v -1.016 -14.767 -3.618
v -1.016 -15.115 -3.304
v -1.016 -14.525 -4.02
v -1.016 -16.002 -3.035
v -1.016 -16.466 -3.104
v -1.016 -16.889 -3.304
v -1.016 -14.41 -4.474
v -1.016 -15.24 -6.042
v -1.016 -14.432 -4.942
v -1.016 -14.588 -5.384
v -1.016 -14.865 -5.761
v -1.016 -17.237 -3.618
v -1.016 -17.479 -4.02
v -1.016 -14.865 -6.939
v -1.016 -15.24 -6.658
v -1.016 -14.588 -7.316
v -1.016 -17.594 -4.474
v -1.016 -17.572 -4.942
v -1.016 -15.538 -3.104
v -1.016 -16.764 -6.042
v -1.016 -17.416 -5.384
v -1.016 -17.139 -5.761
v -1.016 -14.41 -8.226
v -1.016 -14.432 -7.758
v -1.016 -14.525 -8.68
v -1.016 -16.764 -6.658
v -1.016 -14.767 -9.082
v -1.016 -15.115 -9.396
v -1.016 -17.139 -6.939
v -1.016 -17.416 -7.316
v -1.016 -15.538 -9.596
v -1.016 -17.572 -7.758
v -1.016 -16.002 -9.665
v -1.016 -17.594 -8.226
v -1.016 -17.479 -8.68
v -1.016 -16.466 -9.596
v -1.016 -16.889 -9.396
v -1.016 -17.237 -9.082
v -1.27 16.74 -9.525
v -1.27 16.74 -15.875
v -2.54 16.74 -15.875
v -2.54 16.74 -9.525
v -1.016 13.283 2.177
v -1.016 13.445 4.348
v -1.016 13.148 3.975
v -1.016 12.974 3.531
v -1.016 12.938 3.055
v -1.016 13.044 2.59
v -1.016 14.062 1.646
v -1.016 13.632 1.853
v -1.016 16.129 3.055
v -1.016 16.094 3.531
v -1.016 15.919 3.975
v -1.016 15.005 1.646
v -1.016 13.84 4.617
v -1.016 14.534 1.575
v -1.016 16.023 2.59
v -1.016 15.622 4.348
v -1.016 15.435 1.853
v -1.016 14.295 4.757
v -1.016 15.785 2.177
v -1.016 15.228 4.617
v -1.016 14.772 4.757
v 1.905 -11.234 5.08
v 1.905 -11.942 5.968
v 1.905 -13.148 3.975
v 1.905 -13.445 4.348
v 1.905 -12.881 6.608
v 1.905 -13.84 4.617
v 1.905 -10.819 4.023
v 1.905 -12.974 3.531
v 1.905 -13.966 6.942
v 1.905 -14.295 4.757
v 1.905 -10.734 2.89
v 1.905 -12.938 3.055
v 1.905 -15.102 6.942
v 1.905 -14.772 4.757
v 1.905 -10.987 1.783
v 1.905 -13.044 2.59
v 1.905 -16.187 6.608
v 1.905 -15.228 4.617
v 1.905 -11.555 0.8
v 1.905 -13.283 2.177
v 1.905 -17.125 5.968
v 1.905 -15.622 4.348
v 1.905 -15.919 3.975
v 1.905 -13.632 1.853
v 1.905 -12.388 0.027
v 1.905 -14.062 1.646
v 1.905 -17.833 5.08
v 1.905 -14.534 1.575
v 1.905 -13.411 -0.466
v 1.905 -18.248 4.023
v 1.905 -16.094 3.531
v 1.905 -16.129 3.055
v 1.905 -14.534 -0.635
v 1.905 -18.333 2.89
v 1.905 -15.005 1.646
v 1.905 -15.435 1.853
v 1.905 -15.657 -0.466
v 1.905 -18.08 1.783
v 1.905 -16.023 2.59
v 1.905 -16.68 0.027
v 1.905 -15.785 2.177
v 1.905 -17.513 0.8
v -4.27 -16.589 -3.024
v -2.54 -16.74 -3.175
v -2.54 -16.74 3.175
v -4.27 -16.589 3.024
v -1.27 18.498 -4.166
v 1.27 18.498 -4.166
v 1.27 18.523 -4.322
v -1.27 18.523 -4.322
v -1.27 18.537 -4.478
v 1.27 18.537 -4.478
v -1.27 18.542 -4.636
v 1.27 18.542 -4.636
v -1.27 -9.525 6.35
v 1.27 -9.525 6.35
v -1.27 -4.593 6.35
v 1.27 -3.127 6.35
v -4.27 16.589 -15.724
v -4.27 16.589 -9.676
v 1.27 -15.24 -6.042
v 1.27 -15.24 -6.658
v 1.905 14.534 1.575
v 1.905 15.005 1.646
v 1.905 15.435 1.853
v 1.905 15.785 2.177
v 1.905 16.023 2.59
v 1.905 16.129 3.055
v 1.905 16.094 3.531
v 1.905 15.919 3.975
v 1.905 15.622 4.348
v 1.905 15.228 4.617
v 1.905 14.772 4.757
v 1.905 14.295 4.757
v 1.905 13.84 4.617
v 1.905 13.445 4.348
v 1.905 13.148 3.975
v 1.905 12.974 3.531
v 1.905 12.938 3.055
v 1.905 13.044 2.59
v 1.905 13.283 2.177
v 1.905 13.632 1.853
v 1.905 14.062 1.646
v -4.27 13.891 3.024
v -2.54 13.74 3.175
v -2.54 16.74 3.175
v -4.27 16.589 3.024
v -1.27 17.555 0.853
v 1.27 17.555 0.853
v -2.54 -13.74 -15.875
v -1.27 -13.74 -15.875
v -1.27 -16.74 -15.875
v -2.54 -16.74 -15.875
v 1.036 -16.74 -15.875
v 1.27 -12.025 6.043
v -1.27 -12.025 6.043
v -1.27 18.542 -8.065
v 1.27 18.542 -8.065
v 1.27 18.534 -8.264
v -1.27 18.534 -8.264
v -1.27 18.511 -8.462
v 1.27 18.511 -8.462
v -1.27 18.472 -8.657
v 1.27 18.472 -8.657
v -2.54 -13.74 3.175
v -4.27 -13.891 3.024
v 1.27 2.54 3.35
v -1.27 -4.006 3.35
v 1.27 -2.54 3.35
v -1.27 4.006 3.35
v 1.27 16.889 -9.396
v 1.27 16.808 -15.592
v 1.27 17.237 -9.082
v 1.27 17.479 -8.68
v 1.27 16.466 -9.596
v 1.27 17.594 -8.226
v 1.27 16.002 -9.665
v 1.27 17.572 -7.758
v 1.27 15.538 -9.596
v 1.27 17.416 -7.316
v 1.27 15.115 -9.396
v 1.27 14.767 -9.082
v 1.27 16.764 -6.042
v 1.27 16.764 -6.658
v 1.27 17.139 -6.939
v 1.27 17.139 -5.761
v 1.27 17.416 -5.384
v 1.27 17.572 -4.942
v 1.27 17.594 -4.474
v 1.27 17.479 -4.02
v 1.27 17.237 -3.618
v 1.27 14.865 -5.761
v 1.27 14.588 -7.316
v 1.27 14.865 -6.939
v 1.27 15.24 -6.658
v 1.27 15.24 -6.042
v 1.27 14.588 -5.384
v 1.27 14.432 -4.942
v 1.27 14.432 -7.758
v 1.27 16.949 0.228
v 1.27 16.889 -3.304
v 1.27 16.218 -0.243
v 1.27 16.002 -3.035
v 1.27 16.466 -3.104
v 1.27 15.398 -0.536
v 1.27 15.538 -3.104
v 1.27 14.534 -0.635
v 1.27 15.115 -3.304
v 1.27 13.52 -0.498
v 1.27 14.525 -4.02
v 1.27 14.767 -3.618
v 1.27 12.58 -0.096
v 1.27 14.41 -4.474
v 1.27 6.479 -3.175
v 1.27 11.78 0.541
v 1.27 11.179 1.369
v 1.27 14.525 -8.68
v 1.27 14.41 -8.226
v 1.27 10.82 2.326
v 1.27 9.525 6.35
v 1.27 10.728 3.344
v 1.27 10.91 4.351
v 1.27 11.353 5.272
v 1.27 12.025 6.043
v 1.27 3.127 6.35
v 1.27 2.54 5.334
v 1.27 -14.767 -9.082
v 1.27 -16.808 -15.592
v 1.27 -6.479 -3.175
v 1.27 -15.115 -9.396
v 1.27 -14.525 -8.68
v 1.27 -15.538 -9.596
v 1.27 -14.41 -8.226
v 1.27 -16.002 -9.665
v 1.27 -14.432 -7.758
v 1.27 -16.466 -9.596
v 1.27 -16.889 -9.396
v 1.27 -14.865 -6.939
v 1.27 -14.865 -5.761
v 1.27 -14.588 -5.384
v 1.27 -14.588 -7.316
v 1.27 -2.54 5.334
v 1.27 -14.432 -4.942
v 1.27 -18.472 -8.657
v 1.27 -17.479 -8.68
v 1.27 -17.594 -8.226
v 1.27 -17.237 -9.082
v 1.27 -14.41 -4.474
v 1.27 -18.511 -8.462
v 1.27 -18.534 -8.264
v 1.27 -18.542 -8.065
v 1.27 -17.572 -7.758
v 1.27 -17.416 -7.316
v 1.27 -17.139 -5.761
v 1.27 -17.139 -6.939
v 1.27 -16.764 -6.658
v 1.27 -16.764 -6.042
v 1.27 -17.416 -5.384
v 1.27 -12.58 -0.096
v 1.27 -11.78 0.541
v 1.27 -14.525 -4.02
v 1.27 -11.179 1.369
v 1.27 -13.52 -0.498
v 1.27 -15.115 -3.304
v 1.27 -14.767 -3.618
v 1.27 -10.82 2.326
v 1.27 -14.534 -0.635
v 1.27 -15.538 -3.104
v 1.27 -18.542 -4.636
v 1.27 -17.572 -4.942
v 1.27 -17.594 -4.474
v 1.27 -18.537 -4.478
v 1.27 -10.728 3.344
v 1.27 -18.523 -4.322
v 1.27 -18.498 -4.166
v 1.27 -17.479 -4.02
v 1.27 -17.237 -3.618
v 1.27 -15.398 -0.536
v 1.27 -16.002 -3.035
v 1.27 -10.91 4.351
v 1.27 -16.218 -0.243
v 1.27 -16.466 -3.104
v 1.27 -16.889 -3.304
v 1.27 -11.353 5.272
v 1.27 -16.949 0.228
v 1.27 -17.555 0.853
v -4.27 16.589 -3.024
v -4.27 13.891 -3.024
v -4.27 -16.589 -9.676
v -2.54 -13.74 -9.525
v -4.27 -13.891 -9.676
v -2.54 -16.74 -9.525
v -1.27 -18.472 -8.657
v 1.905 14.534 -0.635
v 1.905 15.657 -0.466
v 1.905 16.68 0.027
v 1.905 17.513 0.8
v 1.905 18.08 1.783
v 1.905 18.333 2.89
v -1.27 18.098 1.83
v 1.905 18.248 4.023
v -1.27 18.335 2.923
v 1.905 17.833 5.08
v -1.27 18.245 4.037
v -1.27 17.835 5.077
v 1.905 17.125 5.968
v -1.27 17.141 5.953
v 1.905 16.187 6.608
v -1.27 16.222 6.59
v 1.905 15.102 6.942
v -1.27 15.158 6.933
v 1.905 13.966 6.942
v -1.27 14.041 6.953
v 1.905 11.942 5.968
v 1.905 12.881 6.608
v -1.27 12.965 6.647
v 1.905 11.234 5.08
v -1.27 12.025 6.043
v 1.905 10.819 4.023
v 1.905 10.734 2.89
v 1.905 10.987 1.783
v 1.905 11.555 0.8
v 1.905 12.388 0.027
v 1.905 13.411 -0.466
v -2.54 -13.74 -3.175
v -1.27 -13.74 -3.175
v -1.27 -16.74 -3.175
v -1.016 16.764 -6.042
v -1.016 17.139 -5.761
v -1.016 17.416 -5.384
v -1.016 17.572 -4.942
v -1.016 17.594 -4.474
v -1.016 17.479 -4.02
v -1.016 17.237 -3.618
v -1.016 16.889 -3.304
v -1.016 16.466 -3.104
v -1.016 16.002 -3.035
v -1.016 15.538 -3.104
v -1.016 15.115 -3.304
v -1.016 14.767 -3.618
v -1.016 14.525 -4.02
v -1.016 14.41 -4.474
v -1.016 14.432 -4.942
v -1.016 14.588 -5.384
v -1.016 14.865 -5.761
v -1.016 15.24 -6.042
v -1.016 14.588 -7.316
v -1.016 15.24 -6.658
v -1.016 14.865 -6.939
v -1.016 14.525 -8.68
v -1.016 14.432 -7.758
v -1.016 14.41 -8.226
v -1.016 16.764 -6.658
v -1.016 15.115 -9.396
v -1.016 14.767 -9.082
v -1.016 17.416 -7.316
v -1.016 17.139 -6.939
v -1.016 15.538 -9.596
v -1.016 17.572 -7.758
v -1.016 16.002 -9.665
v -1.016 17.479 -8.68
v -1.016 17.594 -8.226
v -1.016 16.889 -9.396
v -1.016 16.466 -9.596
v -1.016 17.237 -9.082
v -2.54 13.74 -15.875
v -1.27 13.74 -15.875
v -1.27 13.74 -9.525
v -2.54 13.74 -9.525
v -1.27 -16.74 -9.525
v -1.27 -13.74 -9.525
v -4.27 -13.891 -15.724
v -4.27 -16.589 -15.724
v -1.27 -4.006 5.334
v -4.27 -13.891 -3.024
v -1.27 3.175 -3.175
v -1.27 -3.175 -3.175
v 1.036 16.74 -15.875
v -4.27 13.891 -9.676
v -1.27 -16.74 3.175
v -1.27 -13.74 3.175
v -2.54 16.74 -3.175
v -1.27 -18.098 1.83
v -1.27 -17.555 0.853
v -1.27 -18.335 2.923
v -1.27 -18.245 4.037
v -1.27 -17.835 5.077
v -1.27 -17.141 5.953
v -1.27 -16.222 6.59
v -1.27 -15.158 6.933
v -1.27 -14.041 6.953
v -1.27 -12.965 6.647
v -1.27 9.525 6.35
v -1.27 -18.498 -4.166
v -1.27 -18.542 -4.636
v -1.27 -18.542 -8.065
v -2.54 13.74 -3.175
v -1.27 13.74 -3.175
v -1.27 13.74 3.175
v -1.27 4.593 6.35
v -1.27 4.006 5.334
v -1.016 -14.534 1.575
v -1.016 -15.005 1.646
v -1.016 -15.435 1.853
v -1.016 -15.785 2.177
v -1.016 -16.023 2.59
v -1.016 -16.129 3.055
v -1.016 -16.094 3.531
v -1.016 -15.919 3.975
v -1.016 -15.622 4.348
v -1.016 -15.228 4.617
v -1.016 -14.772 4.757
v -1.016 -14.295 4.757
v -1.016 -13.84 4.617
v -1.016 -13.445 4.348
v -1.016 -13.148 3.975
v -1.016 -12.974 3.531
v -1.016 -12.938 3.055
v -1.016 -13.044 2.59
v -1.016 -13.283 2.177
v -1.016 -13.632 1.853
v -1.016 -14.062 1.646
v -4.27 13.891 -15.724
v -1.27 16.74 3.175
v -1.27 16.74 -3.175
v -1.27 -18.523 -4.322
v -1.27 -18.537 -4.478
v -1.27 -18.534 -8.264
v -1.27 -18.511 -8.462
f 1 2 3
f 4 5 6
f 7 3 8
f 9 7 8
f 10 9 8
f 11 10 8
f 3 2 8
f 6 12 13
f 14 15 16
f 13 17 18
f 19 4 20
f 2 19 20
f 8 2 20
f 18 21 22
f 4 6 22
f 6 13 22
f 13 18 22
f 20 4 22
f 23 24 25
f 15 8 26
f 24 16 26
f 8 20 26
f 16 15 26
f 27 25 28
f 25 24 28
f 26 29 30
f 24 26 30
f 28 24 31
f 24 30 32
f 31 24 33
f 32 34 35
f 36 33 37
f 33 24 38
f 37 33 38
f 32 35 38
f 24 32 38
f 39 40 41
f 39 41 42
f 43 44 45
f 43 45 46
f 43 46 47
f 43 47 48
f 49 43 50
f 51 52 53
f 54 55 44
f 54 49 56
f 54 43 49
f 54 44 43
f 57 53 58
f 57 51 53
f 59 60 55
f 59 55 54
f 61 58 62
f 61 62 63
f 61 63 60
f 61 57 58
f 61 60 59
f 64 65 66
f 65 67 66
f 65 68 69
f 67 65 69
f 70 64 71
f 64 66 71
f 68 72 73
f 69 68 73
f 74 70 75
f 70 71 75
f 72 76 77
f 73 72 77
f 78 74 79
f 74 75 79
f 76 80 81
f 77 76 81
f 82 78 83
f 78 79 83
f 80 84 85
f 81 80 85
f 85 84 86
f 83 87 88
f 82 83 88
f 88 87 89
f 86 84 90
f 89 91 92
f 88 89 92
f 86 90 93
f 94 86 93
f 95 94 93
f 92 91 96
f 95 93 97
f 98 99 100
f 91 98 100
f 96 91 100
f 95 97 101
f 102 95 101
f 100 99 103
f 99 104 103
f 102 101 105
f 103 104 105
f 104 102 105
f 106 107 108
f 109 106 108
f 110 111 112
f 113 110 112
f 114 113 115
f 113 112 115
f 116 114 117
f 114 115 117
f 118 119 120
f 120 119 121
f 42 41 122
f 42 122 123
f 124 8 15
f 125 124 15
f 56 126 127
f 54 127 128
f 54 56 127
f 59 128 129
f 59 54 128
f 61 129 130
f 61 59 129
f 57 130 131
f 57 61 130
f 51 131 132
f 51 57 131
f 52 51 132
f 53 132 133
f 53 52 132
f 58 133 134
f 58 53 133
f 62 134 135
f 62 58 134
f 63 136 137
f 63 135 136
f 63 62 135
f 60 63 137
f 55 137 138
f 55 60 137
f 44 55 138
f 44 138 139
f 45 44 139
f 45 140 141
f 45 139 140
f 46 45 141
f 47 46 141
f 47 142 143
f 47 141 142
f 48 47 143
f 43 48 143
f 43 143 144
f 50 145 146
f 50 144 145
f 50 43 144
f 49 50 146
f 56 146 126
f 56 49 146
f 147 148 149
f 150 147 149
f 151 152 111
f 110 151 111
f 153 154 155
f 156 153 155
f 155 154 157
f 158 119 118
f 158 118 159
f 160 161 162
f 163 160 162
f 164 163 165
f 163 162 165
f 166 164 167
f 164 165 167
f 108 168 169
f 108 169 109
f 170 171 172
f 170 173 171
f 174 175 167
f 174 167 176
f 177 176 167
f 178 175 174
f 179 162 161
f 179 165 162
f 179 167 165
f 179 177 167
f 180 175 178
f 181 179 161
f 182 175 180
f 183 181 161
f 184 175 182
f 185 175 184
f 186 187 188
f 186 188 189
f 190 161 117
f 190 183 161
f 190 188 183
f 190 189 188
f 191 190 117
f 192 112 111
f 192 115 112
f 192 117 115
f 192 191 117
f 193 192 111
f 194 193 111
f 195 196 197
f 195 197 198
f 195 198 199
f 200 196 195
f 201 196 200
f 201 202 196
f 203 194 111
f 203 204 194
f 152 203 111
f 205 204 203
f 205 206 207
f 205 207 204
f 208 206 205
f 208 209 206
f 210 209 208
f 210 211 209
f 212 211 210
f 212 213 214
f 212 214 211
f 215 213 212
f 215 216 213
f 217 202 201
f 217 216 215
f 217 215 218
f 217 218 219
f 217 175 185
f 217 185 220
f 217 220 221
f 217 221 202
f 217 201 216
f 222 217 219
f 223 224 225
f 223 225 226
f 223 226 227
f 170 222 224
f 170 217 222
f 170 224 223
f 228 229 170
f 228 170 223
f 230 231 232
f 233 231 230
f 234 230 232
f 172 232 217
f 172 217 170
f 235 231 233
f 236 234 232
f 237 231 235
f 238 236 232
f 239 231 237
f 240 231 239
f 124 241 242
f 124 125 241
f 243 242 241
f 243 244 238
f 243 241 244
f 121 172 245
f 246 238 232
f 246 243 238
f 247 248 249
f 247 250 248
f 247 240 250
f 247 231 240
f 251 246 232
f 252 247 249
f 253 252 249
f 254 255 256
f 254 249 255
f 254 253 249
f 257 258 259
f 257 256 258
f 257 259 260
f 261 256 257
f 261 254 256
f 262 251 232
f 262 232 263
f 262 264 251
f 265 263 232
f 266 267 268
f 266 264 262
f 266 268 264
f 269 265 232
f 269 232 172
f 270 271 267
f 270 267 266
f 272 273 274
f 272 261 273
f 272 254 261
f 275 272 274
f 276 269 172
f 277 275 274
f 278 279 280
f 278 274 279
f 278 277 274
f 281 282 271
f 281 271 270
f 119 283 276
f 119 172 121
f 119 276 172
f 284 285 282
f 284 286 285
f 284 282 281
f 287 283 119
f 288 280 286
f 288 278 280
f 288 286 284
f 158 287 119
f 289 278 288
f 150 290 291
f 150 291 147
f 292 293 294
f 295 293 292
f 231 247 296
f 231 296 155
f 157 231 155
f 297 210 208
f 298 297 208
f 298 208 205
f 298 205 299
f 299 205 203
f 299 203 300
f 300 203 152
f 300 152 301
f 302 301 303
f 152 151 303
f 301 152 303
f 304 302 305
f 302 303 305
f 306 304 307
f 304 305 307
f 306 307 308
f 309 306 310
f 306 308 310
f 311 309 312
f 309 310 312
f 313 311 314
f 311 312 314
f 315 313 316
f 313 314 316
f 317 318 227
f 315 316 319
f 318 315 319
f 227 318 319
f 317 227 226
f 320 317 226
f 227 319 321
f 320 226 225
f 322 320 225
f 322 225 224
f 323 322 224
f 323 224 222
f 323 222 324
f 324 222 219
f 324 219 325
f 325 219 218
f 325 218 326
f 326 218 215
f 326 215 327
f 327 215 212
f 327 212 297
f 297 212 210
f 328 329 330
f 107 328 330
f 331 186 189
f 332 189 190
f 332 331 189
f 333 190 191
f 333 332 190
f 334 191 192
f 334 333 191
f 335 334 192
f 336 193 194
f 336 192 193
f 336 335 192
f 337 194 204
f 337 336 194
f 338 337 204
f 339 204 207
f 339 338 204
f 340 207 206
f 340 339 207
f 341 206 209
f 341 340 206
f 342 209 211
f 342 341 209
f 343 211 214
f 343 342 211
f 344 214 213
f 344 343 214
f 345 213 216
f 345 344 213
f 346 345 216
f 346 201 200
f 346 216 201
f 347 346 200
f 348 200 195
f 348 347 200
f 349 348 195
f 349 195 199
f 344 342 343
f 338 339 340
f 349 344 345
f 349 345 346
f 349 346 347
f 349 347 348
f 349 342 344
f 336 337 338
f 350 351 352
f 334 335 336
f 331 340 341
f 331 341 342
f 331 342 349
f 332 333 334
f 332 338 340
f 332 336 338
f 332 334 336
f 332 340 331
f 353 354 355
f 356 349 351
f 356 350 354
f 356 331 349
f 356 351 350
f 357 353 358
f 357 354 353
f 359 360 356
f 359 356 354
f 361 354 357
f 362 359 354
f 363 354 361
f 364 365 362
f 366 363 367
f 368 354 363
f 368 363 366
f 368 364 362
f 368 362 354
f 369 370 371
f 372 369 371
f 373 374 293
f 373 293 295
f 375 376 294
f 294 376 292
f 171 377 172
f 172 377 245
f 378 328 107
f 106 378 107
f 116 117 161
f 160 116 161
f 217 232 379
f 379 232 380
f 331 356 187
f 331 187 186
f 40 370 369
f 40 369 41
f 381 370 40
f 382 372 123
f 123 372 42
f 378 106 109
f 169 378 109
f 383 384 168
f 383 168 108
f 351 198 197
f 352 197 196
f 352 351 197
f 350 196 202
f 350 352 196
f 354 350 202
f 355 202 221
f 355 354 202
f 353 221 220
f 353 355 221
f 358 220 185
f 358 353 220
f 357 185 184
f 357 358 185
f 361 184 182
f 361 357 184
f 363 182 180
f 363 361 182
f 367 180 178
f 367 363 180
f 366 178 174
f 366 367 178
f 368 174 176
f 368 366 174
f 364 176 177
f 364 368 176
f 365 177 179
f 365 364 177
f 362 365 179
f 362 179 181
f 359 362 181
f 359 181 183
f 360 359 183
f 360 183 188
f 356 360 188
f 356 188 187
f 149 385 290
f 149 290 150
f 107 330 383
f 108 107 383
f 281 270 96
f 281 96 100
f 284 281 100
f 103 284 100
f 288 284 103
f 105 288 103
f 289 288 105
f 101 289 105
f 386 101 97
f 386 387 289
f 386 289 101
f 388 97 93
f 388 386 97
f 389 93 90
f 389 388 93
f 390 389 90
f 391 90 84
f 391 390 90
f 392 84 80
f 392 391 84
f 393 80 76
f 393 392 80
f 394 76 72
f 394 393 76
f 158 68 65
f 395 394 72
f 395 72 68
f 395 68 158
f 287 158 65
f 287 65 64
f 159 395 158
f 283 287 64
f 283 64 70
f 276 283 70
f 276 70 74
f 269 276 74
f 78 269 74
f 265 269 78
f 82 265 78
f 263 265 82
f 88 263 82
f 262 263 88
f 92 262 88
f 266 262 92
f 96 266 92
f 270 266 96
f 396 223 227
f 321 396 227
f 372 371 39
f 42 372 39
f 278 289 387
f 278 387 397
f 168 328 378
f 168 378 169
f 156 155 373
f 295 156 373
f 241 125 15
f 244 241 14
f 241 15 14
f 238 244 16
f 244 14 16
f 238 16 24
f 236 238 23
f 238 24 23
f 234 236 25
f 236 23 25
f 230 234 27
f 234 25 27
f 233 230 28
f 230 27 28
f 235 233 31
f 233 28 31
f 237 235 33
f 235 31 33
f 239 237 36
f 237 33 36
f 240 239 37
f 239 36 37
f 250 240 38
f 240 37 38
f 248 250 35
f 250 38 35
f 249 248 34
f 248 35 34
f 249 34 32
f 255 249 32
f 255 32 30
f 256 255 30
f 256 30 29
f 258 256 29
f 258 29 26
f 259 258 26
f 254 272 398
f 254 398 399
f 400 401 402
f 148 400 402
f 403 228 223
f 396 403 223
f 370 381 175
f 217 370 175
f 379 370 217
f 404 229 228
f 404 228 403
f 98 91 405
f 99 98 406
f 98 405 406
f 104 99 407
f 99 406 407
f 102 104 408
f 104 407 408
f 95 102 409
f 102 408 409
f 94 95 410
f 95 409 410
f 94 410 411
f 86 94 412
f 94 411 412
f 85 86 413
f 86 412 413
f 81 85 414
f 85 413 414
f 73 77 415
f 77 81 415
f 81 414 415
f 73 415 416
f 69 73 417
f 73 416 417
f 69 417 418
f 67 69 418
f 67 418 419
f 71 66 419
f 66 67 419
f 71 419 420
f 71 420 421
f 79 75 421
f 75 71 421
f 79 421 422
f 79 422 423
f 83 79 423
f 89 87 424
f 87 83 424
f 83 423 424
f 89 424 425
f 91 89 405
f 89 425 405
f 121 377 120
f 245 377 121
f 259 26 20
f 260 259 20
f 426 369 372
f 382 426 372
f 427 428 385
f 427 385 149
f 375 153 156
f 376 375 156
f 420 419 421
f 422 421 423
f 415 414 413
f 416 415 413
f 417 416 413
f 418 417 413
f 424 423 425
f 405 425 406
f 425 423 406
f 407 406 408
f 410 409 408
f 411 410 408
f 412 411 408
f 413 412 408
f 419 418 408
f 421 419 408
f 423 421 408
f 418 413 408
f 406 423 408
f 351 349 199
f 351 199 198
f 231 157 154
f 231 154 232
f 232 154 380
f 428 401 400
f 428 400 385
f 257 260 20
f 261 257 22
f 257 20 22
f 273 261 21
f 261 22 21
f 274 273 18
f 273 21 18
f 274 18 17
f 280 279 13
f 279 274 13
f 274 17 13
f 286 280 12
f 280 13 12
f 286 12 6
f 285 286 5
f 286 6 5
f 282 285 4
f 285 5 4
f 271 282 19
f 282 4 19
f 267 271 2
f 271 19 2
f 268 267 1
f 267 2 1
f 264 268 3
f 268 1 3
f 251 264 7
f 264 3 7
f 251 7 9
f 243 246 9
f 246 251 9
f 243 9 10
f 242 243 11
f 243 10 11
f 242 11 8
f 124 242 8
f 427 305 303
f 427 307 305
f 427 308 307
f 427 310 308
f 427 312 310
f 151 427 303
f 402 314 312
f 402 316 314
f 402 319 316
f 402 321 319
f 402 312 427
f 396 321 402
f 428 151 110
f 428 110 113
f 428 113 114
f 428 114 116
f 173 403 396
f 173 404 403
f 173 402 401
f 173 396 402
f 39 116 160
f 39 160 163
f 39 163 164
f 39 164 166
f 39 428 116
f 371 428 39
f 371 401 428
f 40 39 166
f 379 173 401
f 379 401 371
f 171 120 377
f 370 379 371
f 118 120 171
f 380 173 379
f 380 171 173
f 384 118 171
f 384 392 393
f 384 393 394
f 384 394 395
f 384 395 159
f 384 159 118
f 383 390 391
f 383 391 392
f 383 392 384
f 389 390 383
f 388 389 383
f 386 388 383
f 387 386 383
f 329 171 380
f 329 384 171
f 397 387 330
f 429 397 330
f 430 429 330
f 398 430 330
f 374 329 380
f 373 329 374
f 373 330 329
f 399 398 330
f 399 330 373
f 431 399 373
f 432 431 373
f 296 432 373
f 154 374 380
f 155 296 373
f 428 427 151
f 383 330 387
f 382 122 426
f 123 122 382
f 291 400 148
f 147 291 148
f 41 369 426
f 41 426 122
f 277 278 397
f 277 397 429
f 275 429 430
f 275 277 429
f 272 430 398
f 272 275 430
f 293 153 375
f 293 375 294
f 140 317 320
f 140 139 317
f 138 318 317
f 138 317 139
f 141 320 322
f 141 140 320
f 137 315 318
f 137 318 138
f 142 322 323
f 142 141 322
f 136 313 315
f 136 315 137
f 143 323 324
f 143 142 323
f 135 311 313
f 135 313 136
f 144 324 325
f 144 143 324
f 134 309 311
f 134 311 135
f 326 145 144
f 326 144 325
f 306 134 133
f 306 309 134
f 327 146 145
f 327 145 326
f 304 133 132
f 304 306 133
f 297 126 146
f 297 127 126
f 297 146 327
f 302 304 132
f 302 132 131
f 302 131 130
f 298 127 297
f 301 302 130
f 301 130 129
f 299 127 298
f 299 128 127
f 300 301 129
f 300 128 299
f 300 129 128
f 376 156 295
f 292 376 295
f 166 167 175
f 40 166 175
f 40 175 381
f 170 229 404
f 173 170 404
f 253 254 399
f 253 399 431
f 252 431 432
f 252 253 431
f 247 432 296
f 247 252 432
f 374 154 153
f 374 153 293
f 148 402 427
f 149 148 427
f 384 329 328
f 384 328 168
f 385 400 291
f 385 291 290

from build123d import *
from OCP.BRepFilletAPI import BRepFilletAPI_MakeChamfer

# Parameters (mm, degrees)
DOWELSUPPORT_DEPTH       = 1.905
DOWELSUPPORT_DEPTH_BACK  = 1.27
SKETCH3_R                = 3.81
SKETCH5_W                = 9.525
SKETCH5_H                = 19.05
SLIDERDOWELSUPPORT_DEPTH = 1.27
STRINGDOWELSUPPORT_DEPTH = 1.27
SKETCH9_W                = 6.35
SKETCH9_H                = 3
TABSUPPORT_DEPTH         = 1.27
INTERSUPPORT_DEPTH       = 1.27
DOWELHOLES_DEPTH         = 25.48367648
DOWELHOLES_DEPTH_BACK    = 25.48367648
SKETCH11_R               = 1.600000102
BOSS_EXTRUDE1_START      = -1.27
SKETCH11_2_R             = 1.600000102
BOSS_EXTRUDE1_DEPTH      = 0.254
SKETCH14_W               = 6.35
SKETCH14_H               = 3
TABBASE_DEPTH            = 1.27
SKETCH15_W               = 6.35
SKETCH15_H               = 3
TABDRAFT_DEPTH           = 1.73
TABDRAFT_DRAFT           = 5
TABDRAFT_PROFILE_2_DEPTH = 1.73
TABDRAFT_PROFILE_2_DRAFT = 5
CHAMFER1_SIZE            = 2.54
CUT_EXTRUDE2_DEPTH       = 3
CHAMFER2_SIZE            = 0.508
CHAMFER2_SIZE2           = 1.016


with BuildPart() as part:
    # Sketch3 → DowelSupport (new, two sides: drawn at the far end of the back side and taken through both)
    with BuildSketch(Plane(origin=(0, 0, 0), x_dir=(0, 0, -1), z_dir=(1, 0, 0)).offset(-DOWELSUPPORT_DEPTH_BACK)):
        with Locations((-3.175, 14.53375)):
            Circle(SKETCH3_R)
    extrude(amount=DOWELSUPPORT_DEPTH + DOWELSUPPORT_DEPTH_BACK)



with BuildPart() as body_2:
    # Sketch5 → SliderDowelSupport (new, symmetric)
    with BuildSketch(Plane(origin=(0, 0, 0), x_dir=(0, 0, -1), z_dir=(1, 0, 0))):
        with Locations((-1.5875, 0)):
            Rectangle(SKETCH5_W, SKETCH5_H)
    extrude(amount=SLIDERDOWELSUPPORT_DEPTH, both=True)


with BuildPart() as body_3:
    # Sketch8 → StringDowelSupport (new, symmetric)
    with BuildSketch(Plane(origin=(0, 0, 0), x_dir=(0, 0, -1), z_dir=(1, 0, 0))):
        with BuildLine():
            Line((4.6355, 18.542), (8.0645, 18.542))
            ThreePointArc((8.0645, 18.542), (10.6045, 16.002), (8.0645, 13.462))
            Line((8.0645, 13.462), (4.6355, 13.462))
            ThreePointArc((4.6355, 13.462), (2.0955, 16.002), (4.6355, 18.542))
        make_face()
    extrude(amount=STRINGDOWELSUPPORT_DEPTH, both=True)


with BuildPart() as part_1:
    add(part.part)

    add(body_3.part)  # TabSupport merges body 3
    # Sketch9 → TabSupport (add, symmetric)
    with BuildSketch(Plane(origin=(0, 0, 0), x_dir=(0, 0, -1), z_dir=(1, 0, 0))):
        with Locations((0, 15.24)):
            Rectangle(SKETCH9_W, SKETCH9_H)
        with Locations((12.7, 15.24)):
            Rectangle(SKETCH9_W, SKETCH9_H)
    extrude(amount=TABSUPPORT_DEPTH, both=True)


    add(body_2.part)  # InterSupport merges body 2
    # Sketch10 → InterSupport (add, symmetric)
    with BuildSketch(Plane(origin=(0, 0, 0), x_dir=(0, 0, -1), z_dir=(1, 0, 0))):
        Polygon((-6.35, 9.525), (-5.696013987, 14.843731414), (-3.644260291, 17.030026182), (4.166239709, 18.498276182), (8.657140431, 18.471894192), (15.875, 16.74), (15.875, 13.74), (3.175, 3.175), (3.175, 9.525), align=None)
    extrude(amount=INTERSUPPORT_DEPTH, both=True)

    # Sketch11 → DowelHoles (cut, two sides: drawn at the far end of the back side and taken through both)
    with BuildSketch(Plane(origin=(0, 0, 0), x_dir=(0, 0, -1), z_dir=(1, 0, 0)).offset(-DOWELHOLES_DEPTH_BACK)):
        with Locations((-3.175, 14.53375)):
            Circle(SKETCH11_R)
        with BuildLine():
            Line((6.04239599, 15.24), (6.65760401, 15.24))
            ThreePointArc((6.65760401, 15.24), (9.664500102, 16.002), (6.65760401, 16.764))
            Line((6.65760401, 16.764), (6.04239599, 16.764))
            ThreePointArc((6.04239599, 16.764), (3.035499898, 16.002), (6.04239599, 15.24))
        make_face()
    extrude(amount=DOWELHOLES_DEPTH + DOWELHOLES_DEPTH_BACK, mode=Mode.SUBTRACT)

    # Sketch11<2> → Boss-Extrude1 (add)
    with BuildSketch(Plane(origin=(0, 0, 0), x_dir=(0, 0, -1), z_dir=(1, 0, 0)).offset(BOSS_EXTRUDE1_START)):
        with BuildLine():
            Line((6.04239599, 15.24), (6.65760401, 15.24))
            ThreePointArc((6.65760401, 15.24), (9.664500102, 16.002), (6.65760401, 16.764))
            Line((6.65760401, 16.764), (6.04239599, 16.764))
            ThreePointArc((6.04239599, 16.764), (3.035499898, 16.002), (6.04239599, 15.24))
        make_face()
        with Locations((-3.175, 14.53375)):
            Circle(SKETCH11_2_R)
    extrude(amount=BOSS_EXTRUDE1_DEPTH)

    # Sketch14 → TabBase (add)
    with BuildSketch(Plane.ZY.offset(1.27)):
        with Locations((-12.7, 15.24)):
            Rectangle(SKETCH14_W, SKETCH14_H)
        with Locations((0, 15.24)):
            Rectangle(SKETCH14_W, SKETCH14_H)
    extrude(amount=TABBASE_DEPTH)


with BuildPart() as tabdraft_tool:
    # Sketch15 → TabDraft (with draft: the straight prism first)
    with BuildSketch(Plane.ZY.offset(2.54)):
        with Locations((0, 15.24)):
            Rectangle(SKETCH15_W, SKETCH15_H)
    extrude(amount=TABDRAFT_DEPTH)
    # TabDraft: the draft: its side faces are tilted about the plane it starts from
    tabdraft_sides = [tabdraft_tool.faces().sort_by_distance(p)[0] for p in [
        (-3.405, 15.24, -3.175),
        (-3.405, 13.74, 0),
        (-3.405, 15.24, 3.175),
        (-3.405, 16.74, 0),
    ]]
    draft(tabdraft_sides, Plane.ZY.offset(2.54), TABDRAFT_DRAFT)


with BuildPart() as part_2:
    add(part_1.part)

    # TabDraft: add tabdraft_tool
    add(tabdraft_tool.part)


with BuildPart() as tabdraft_profile_2_tool:
    # Sketch15 → TabDraft profile 2 (with draft: the straight prism first)
    with BuildSketch(Plane.ZY.offset(2.54)):
        with Locations((-12.7, 15.24)):
            Rectangle(SKETCH15_W, SKETCH15_H)
    extrude(amount=TABDRAFT_PROFILE_2_DEPTH)
    # TabDraft profile 2: the draft: its side faces are tilted about the plane it starts from
    tabdraft_profile_2_sides = [tabdraft_profile_2_tool.faces().sort_by_distance(p)[0] for p in [
        (-3.405, 15.24, -15.875),
        (-3.405, 13.74, -12.7),
        (-3.405, 15.24, -9.525),
        (-3.405, 16.74, -12.7),
    ]]
    draft(tabdraft_profile_2_sides, Plane.ZY.offset(2.54), TABDRAFT_PROFILE_2_DRAFT)


with BuildPart() as part_3:
    add(part_2.part)

    # TabDraft profile 2: add tabdraft_profile_2_tool
    add(tabdraft_profile_2_tool.part)

    # Chamfer1
    chamfer1_edges = [part_3.edges().sort_by_distance(p)[0] for p in [
        (1.27, 8.4575, -9.525),
    ]]
    chamfer(chamfer1_edges, length=CHAMFER1_SIZE - 0.0001)  # a hair under: the kernel refuses the full size

    # Mirror1: part across plane


with BuildPart() as part_4:
    add(part_3.part)
    add(part_3.part.mirror(Plane.ZX))

    # Sketch17 → Cut-Extrude2 (cut)
    with BuildSketch(Plane.XY.offset(6.35)):
        Polygon((-1.27, -4.006469684), (1.27, -2.54), (1.27, 2.54), (-1.27, 4.006469684), align=None)
    extrude(amount=-CUT_EXTRUDE2_DEPTH, mode=Mode.SUBTRACT)

    # Chamfer2: one chamfer whose edges measure the first distance from different faces: ONE call of the kernel's chamfer builder (chamfer() names one face for all edges)
    chamfer2_edges_1 = [part_4.edges().sort_by_distance(p)[0] for p in [
        (0, -3.273234842, 6.35),
    ]]
    chamfer2_side_1 = [part_4.faces().sort_by_distance(p)[0] for p in [
        (0.049650417, -6.38478458, 6.35),
    ]]
    chamfer2_edges_2 = [part_4.edges().sort_by_distance(p)[0] for p in [
        (0, 3.273234842, 6.35),
    ]]
    chamfer2_side_2 = [part_4.faces().sort_by_distance(p)[0] for p in [
        (0.049650417, 6.38478458, 6.35),
    ]]
    chamfer2 = BRepFilletAPI_MakeChamfer(part_4.part.solid().wrapped)
    for e in chamfer2_edges_1:
        chamfer2.Add(CHAMFER2_SIZE, CHAMFER2_SIZE2, e.wrapped, chamfer2_side_1[0].wrapped)  # the first distance lies on this face
    for e in chamfer2_edges_2:
        chamfer2.Add(CHAMFER2_SIZE, CHAMFER2_SIZE2, e.wrapped, chamfer2_side_2[0].wrapped)  # the first distance lies on this face
    add(Compound.cast(chamfer2.Shape()), mode=Mode.REPLACE)


solid = part_4.part
